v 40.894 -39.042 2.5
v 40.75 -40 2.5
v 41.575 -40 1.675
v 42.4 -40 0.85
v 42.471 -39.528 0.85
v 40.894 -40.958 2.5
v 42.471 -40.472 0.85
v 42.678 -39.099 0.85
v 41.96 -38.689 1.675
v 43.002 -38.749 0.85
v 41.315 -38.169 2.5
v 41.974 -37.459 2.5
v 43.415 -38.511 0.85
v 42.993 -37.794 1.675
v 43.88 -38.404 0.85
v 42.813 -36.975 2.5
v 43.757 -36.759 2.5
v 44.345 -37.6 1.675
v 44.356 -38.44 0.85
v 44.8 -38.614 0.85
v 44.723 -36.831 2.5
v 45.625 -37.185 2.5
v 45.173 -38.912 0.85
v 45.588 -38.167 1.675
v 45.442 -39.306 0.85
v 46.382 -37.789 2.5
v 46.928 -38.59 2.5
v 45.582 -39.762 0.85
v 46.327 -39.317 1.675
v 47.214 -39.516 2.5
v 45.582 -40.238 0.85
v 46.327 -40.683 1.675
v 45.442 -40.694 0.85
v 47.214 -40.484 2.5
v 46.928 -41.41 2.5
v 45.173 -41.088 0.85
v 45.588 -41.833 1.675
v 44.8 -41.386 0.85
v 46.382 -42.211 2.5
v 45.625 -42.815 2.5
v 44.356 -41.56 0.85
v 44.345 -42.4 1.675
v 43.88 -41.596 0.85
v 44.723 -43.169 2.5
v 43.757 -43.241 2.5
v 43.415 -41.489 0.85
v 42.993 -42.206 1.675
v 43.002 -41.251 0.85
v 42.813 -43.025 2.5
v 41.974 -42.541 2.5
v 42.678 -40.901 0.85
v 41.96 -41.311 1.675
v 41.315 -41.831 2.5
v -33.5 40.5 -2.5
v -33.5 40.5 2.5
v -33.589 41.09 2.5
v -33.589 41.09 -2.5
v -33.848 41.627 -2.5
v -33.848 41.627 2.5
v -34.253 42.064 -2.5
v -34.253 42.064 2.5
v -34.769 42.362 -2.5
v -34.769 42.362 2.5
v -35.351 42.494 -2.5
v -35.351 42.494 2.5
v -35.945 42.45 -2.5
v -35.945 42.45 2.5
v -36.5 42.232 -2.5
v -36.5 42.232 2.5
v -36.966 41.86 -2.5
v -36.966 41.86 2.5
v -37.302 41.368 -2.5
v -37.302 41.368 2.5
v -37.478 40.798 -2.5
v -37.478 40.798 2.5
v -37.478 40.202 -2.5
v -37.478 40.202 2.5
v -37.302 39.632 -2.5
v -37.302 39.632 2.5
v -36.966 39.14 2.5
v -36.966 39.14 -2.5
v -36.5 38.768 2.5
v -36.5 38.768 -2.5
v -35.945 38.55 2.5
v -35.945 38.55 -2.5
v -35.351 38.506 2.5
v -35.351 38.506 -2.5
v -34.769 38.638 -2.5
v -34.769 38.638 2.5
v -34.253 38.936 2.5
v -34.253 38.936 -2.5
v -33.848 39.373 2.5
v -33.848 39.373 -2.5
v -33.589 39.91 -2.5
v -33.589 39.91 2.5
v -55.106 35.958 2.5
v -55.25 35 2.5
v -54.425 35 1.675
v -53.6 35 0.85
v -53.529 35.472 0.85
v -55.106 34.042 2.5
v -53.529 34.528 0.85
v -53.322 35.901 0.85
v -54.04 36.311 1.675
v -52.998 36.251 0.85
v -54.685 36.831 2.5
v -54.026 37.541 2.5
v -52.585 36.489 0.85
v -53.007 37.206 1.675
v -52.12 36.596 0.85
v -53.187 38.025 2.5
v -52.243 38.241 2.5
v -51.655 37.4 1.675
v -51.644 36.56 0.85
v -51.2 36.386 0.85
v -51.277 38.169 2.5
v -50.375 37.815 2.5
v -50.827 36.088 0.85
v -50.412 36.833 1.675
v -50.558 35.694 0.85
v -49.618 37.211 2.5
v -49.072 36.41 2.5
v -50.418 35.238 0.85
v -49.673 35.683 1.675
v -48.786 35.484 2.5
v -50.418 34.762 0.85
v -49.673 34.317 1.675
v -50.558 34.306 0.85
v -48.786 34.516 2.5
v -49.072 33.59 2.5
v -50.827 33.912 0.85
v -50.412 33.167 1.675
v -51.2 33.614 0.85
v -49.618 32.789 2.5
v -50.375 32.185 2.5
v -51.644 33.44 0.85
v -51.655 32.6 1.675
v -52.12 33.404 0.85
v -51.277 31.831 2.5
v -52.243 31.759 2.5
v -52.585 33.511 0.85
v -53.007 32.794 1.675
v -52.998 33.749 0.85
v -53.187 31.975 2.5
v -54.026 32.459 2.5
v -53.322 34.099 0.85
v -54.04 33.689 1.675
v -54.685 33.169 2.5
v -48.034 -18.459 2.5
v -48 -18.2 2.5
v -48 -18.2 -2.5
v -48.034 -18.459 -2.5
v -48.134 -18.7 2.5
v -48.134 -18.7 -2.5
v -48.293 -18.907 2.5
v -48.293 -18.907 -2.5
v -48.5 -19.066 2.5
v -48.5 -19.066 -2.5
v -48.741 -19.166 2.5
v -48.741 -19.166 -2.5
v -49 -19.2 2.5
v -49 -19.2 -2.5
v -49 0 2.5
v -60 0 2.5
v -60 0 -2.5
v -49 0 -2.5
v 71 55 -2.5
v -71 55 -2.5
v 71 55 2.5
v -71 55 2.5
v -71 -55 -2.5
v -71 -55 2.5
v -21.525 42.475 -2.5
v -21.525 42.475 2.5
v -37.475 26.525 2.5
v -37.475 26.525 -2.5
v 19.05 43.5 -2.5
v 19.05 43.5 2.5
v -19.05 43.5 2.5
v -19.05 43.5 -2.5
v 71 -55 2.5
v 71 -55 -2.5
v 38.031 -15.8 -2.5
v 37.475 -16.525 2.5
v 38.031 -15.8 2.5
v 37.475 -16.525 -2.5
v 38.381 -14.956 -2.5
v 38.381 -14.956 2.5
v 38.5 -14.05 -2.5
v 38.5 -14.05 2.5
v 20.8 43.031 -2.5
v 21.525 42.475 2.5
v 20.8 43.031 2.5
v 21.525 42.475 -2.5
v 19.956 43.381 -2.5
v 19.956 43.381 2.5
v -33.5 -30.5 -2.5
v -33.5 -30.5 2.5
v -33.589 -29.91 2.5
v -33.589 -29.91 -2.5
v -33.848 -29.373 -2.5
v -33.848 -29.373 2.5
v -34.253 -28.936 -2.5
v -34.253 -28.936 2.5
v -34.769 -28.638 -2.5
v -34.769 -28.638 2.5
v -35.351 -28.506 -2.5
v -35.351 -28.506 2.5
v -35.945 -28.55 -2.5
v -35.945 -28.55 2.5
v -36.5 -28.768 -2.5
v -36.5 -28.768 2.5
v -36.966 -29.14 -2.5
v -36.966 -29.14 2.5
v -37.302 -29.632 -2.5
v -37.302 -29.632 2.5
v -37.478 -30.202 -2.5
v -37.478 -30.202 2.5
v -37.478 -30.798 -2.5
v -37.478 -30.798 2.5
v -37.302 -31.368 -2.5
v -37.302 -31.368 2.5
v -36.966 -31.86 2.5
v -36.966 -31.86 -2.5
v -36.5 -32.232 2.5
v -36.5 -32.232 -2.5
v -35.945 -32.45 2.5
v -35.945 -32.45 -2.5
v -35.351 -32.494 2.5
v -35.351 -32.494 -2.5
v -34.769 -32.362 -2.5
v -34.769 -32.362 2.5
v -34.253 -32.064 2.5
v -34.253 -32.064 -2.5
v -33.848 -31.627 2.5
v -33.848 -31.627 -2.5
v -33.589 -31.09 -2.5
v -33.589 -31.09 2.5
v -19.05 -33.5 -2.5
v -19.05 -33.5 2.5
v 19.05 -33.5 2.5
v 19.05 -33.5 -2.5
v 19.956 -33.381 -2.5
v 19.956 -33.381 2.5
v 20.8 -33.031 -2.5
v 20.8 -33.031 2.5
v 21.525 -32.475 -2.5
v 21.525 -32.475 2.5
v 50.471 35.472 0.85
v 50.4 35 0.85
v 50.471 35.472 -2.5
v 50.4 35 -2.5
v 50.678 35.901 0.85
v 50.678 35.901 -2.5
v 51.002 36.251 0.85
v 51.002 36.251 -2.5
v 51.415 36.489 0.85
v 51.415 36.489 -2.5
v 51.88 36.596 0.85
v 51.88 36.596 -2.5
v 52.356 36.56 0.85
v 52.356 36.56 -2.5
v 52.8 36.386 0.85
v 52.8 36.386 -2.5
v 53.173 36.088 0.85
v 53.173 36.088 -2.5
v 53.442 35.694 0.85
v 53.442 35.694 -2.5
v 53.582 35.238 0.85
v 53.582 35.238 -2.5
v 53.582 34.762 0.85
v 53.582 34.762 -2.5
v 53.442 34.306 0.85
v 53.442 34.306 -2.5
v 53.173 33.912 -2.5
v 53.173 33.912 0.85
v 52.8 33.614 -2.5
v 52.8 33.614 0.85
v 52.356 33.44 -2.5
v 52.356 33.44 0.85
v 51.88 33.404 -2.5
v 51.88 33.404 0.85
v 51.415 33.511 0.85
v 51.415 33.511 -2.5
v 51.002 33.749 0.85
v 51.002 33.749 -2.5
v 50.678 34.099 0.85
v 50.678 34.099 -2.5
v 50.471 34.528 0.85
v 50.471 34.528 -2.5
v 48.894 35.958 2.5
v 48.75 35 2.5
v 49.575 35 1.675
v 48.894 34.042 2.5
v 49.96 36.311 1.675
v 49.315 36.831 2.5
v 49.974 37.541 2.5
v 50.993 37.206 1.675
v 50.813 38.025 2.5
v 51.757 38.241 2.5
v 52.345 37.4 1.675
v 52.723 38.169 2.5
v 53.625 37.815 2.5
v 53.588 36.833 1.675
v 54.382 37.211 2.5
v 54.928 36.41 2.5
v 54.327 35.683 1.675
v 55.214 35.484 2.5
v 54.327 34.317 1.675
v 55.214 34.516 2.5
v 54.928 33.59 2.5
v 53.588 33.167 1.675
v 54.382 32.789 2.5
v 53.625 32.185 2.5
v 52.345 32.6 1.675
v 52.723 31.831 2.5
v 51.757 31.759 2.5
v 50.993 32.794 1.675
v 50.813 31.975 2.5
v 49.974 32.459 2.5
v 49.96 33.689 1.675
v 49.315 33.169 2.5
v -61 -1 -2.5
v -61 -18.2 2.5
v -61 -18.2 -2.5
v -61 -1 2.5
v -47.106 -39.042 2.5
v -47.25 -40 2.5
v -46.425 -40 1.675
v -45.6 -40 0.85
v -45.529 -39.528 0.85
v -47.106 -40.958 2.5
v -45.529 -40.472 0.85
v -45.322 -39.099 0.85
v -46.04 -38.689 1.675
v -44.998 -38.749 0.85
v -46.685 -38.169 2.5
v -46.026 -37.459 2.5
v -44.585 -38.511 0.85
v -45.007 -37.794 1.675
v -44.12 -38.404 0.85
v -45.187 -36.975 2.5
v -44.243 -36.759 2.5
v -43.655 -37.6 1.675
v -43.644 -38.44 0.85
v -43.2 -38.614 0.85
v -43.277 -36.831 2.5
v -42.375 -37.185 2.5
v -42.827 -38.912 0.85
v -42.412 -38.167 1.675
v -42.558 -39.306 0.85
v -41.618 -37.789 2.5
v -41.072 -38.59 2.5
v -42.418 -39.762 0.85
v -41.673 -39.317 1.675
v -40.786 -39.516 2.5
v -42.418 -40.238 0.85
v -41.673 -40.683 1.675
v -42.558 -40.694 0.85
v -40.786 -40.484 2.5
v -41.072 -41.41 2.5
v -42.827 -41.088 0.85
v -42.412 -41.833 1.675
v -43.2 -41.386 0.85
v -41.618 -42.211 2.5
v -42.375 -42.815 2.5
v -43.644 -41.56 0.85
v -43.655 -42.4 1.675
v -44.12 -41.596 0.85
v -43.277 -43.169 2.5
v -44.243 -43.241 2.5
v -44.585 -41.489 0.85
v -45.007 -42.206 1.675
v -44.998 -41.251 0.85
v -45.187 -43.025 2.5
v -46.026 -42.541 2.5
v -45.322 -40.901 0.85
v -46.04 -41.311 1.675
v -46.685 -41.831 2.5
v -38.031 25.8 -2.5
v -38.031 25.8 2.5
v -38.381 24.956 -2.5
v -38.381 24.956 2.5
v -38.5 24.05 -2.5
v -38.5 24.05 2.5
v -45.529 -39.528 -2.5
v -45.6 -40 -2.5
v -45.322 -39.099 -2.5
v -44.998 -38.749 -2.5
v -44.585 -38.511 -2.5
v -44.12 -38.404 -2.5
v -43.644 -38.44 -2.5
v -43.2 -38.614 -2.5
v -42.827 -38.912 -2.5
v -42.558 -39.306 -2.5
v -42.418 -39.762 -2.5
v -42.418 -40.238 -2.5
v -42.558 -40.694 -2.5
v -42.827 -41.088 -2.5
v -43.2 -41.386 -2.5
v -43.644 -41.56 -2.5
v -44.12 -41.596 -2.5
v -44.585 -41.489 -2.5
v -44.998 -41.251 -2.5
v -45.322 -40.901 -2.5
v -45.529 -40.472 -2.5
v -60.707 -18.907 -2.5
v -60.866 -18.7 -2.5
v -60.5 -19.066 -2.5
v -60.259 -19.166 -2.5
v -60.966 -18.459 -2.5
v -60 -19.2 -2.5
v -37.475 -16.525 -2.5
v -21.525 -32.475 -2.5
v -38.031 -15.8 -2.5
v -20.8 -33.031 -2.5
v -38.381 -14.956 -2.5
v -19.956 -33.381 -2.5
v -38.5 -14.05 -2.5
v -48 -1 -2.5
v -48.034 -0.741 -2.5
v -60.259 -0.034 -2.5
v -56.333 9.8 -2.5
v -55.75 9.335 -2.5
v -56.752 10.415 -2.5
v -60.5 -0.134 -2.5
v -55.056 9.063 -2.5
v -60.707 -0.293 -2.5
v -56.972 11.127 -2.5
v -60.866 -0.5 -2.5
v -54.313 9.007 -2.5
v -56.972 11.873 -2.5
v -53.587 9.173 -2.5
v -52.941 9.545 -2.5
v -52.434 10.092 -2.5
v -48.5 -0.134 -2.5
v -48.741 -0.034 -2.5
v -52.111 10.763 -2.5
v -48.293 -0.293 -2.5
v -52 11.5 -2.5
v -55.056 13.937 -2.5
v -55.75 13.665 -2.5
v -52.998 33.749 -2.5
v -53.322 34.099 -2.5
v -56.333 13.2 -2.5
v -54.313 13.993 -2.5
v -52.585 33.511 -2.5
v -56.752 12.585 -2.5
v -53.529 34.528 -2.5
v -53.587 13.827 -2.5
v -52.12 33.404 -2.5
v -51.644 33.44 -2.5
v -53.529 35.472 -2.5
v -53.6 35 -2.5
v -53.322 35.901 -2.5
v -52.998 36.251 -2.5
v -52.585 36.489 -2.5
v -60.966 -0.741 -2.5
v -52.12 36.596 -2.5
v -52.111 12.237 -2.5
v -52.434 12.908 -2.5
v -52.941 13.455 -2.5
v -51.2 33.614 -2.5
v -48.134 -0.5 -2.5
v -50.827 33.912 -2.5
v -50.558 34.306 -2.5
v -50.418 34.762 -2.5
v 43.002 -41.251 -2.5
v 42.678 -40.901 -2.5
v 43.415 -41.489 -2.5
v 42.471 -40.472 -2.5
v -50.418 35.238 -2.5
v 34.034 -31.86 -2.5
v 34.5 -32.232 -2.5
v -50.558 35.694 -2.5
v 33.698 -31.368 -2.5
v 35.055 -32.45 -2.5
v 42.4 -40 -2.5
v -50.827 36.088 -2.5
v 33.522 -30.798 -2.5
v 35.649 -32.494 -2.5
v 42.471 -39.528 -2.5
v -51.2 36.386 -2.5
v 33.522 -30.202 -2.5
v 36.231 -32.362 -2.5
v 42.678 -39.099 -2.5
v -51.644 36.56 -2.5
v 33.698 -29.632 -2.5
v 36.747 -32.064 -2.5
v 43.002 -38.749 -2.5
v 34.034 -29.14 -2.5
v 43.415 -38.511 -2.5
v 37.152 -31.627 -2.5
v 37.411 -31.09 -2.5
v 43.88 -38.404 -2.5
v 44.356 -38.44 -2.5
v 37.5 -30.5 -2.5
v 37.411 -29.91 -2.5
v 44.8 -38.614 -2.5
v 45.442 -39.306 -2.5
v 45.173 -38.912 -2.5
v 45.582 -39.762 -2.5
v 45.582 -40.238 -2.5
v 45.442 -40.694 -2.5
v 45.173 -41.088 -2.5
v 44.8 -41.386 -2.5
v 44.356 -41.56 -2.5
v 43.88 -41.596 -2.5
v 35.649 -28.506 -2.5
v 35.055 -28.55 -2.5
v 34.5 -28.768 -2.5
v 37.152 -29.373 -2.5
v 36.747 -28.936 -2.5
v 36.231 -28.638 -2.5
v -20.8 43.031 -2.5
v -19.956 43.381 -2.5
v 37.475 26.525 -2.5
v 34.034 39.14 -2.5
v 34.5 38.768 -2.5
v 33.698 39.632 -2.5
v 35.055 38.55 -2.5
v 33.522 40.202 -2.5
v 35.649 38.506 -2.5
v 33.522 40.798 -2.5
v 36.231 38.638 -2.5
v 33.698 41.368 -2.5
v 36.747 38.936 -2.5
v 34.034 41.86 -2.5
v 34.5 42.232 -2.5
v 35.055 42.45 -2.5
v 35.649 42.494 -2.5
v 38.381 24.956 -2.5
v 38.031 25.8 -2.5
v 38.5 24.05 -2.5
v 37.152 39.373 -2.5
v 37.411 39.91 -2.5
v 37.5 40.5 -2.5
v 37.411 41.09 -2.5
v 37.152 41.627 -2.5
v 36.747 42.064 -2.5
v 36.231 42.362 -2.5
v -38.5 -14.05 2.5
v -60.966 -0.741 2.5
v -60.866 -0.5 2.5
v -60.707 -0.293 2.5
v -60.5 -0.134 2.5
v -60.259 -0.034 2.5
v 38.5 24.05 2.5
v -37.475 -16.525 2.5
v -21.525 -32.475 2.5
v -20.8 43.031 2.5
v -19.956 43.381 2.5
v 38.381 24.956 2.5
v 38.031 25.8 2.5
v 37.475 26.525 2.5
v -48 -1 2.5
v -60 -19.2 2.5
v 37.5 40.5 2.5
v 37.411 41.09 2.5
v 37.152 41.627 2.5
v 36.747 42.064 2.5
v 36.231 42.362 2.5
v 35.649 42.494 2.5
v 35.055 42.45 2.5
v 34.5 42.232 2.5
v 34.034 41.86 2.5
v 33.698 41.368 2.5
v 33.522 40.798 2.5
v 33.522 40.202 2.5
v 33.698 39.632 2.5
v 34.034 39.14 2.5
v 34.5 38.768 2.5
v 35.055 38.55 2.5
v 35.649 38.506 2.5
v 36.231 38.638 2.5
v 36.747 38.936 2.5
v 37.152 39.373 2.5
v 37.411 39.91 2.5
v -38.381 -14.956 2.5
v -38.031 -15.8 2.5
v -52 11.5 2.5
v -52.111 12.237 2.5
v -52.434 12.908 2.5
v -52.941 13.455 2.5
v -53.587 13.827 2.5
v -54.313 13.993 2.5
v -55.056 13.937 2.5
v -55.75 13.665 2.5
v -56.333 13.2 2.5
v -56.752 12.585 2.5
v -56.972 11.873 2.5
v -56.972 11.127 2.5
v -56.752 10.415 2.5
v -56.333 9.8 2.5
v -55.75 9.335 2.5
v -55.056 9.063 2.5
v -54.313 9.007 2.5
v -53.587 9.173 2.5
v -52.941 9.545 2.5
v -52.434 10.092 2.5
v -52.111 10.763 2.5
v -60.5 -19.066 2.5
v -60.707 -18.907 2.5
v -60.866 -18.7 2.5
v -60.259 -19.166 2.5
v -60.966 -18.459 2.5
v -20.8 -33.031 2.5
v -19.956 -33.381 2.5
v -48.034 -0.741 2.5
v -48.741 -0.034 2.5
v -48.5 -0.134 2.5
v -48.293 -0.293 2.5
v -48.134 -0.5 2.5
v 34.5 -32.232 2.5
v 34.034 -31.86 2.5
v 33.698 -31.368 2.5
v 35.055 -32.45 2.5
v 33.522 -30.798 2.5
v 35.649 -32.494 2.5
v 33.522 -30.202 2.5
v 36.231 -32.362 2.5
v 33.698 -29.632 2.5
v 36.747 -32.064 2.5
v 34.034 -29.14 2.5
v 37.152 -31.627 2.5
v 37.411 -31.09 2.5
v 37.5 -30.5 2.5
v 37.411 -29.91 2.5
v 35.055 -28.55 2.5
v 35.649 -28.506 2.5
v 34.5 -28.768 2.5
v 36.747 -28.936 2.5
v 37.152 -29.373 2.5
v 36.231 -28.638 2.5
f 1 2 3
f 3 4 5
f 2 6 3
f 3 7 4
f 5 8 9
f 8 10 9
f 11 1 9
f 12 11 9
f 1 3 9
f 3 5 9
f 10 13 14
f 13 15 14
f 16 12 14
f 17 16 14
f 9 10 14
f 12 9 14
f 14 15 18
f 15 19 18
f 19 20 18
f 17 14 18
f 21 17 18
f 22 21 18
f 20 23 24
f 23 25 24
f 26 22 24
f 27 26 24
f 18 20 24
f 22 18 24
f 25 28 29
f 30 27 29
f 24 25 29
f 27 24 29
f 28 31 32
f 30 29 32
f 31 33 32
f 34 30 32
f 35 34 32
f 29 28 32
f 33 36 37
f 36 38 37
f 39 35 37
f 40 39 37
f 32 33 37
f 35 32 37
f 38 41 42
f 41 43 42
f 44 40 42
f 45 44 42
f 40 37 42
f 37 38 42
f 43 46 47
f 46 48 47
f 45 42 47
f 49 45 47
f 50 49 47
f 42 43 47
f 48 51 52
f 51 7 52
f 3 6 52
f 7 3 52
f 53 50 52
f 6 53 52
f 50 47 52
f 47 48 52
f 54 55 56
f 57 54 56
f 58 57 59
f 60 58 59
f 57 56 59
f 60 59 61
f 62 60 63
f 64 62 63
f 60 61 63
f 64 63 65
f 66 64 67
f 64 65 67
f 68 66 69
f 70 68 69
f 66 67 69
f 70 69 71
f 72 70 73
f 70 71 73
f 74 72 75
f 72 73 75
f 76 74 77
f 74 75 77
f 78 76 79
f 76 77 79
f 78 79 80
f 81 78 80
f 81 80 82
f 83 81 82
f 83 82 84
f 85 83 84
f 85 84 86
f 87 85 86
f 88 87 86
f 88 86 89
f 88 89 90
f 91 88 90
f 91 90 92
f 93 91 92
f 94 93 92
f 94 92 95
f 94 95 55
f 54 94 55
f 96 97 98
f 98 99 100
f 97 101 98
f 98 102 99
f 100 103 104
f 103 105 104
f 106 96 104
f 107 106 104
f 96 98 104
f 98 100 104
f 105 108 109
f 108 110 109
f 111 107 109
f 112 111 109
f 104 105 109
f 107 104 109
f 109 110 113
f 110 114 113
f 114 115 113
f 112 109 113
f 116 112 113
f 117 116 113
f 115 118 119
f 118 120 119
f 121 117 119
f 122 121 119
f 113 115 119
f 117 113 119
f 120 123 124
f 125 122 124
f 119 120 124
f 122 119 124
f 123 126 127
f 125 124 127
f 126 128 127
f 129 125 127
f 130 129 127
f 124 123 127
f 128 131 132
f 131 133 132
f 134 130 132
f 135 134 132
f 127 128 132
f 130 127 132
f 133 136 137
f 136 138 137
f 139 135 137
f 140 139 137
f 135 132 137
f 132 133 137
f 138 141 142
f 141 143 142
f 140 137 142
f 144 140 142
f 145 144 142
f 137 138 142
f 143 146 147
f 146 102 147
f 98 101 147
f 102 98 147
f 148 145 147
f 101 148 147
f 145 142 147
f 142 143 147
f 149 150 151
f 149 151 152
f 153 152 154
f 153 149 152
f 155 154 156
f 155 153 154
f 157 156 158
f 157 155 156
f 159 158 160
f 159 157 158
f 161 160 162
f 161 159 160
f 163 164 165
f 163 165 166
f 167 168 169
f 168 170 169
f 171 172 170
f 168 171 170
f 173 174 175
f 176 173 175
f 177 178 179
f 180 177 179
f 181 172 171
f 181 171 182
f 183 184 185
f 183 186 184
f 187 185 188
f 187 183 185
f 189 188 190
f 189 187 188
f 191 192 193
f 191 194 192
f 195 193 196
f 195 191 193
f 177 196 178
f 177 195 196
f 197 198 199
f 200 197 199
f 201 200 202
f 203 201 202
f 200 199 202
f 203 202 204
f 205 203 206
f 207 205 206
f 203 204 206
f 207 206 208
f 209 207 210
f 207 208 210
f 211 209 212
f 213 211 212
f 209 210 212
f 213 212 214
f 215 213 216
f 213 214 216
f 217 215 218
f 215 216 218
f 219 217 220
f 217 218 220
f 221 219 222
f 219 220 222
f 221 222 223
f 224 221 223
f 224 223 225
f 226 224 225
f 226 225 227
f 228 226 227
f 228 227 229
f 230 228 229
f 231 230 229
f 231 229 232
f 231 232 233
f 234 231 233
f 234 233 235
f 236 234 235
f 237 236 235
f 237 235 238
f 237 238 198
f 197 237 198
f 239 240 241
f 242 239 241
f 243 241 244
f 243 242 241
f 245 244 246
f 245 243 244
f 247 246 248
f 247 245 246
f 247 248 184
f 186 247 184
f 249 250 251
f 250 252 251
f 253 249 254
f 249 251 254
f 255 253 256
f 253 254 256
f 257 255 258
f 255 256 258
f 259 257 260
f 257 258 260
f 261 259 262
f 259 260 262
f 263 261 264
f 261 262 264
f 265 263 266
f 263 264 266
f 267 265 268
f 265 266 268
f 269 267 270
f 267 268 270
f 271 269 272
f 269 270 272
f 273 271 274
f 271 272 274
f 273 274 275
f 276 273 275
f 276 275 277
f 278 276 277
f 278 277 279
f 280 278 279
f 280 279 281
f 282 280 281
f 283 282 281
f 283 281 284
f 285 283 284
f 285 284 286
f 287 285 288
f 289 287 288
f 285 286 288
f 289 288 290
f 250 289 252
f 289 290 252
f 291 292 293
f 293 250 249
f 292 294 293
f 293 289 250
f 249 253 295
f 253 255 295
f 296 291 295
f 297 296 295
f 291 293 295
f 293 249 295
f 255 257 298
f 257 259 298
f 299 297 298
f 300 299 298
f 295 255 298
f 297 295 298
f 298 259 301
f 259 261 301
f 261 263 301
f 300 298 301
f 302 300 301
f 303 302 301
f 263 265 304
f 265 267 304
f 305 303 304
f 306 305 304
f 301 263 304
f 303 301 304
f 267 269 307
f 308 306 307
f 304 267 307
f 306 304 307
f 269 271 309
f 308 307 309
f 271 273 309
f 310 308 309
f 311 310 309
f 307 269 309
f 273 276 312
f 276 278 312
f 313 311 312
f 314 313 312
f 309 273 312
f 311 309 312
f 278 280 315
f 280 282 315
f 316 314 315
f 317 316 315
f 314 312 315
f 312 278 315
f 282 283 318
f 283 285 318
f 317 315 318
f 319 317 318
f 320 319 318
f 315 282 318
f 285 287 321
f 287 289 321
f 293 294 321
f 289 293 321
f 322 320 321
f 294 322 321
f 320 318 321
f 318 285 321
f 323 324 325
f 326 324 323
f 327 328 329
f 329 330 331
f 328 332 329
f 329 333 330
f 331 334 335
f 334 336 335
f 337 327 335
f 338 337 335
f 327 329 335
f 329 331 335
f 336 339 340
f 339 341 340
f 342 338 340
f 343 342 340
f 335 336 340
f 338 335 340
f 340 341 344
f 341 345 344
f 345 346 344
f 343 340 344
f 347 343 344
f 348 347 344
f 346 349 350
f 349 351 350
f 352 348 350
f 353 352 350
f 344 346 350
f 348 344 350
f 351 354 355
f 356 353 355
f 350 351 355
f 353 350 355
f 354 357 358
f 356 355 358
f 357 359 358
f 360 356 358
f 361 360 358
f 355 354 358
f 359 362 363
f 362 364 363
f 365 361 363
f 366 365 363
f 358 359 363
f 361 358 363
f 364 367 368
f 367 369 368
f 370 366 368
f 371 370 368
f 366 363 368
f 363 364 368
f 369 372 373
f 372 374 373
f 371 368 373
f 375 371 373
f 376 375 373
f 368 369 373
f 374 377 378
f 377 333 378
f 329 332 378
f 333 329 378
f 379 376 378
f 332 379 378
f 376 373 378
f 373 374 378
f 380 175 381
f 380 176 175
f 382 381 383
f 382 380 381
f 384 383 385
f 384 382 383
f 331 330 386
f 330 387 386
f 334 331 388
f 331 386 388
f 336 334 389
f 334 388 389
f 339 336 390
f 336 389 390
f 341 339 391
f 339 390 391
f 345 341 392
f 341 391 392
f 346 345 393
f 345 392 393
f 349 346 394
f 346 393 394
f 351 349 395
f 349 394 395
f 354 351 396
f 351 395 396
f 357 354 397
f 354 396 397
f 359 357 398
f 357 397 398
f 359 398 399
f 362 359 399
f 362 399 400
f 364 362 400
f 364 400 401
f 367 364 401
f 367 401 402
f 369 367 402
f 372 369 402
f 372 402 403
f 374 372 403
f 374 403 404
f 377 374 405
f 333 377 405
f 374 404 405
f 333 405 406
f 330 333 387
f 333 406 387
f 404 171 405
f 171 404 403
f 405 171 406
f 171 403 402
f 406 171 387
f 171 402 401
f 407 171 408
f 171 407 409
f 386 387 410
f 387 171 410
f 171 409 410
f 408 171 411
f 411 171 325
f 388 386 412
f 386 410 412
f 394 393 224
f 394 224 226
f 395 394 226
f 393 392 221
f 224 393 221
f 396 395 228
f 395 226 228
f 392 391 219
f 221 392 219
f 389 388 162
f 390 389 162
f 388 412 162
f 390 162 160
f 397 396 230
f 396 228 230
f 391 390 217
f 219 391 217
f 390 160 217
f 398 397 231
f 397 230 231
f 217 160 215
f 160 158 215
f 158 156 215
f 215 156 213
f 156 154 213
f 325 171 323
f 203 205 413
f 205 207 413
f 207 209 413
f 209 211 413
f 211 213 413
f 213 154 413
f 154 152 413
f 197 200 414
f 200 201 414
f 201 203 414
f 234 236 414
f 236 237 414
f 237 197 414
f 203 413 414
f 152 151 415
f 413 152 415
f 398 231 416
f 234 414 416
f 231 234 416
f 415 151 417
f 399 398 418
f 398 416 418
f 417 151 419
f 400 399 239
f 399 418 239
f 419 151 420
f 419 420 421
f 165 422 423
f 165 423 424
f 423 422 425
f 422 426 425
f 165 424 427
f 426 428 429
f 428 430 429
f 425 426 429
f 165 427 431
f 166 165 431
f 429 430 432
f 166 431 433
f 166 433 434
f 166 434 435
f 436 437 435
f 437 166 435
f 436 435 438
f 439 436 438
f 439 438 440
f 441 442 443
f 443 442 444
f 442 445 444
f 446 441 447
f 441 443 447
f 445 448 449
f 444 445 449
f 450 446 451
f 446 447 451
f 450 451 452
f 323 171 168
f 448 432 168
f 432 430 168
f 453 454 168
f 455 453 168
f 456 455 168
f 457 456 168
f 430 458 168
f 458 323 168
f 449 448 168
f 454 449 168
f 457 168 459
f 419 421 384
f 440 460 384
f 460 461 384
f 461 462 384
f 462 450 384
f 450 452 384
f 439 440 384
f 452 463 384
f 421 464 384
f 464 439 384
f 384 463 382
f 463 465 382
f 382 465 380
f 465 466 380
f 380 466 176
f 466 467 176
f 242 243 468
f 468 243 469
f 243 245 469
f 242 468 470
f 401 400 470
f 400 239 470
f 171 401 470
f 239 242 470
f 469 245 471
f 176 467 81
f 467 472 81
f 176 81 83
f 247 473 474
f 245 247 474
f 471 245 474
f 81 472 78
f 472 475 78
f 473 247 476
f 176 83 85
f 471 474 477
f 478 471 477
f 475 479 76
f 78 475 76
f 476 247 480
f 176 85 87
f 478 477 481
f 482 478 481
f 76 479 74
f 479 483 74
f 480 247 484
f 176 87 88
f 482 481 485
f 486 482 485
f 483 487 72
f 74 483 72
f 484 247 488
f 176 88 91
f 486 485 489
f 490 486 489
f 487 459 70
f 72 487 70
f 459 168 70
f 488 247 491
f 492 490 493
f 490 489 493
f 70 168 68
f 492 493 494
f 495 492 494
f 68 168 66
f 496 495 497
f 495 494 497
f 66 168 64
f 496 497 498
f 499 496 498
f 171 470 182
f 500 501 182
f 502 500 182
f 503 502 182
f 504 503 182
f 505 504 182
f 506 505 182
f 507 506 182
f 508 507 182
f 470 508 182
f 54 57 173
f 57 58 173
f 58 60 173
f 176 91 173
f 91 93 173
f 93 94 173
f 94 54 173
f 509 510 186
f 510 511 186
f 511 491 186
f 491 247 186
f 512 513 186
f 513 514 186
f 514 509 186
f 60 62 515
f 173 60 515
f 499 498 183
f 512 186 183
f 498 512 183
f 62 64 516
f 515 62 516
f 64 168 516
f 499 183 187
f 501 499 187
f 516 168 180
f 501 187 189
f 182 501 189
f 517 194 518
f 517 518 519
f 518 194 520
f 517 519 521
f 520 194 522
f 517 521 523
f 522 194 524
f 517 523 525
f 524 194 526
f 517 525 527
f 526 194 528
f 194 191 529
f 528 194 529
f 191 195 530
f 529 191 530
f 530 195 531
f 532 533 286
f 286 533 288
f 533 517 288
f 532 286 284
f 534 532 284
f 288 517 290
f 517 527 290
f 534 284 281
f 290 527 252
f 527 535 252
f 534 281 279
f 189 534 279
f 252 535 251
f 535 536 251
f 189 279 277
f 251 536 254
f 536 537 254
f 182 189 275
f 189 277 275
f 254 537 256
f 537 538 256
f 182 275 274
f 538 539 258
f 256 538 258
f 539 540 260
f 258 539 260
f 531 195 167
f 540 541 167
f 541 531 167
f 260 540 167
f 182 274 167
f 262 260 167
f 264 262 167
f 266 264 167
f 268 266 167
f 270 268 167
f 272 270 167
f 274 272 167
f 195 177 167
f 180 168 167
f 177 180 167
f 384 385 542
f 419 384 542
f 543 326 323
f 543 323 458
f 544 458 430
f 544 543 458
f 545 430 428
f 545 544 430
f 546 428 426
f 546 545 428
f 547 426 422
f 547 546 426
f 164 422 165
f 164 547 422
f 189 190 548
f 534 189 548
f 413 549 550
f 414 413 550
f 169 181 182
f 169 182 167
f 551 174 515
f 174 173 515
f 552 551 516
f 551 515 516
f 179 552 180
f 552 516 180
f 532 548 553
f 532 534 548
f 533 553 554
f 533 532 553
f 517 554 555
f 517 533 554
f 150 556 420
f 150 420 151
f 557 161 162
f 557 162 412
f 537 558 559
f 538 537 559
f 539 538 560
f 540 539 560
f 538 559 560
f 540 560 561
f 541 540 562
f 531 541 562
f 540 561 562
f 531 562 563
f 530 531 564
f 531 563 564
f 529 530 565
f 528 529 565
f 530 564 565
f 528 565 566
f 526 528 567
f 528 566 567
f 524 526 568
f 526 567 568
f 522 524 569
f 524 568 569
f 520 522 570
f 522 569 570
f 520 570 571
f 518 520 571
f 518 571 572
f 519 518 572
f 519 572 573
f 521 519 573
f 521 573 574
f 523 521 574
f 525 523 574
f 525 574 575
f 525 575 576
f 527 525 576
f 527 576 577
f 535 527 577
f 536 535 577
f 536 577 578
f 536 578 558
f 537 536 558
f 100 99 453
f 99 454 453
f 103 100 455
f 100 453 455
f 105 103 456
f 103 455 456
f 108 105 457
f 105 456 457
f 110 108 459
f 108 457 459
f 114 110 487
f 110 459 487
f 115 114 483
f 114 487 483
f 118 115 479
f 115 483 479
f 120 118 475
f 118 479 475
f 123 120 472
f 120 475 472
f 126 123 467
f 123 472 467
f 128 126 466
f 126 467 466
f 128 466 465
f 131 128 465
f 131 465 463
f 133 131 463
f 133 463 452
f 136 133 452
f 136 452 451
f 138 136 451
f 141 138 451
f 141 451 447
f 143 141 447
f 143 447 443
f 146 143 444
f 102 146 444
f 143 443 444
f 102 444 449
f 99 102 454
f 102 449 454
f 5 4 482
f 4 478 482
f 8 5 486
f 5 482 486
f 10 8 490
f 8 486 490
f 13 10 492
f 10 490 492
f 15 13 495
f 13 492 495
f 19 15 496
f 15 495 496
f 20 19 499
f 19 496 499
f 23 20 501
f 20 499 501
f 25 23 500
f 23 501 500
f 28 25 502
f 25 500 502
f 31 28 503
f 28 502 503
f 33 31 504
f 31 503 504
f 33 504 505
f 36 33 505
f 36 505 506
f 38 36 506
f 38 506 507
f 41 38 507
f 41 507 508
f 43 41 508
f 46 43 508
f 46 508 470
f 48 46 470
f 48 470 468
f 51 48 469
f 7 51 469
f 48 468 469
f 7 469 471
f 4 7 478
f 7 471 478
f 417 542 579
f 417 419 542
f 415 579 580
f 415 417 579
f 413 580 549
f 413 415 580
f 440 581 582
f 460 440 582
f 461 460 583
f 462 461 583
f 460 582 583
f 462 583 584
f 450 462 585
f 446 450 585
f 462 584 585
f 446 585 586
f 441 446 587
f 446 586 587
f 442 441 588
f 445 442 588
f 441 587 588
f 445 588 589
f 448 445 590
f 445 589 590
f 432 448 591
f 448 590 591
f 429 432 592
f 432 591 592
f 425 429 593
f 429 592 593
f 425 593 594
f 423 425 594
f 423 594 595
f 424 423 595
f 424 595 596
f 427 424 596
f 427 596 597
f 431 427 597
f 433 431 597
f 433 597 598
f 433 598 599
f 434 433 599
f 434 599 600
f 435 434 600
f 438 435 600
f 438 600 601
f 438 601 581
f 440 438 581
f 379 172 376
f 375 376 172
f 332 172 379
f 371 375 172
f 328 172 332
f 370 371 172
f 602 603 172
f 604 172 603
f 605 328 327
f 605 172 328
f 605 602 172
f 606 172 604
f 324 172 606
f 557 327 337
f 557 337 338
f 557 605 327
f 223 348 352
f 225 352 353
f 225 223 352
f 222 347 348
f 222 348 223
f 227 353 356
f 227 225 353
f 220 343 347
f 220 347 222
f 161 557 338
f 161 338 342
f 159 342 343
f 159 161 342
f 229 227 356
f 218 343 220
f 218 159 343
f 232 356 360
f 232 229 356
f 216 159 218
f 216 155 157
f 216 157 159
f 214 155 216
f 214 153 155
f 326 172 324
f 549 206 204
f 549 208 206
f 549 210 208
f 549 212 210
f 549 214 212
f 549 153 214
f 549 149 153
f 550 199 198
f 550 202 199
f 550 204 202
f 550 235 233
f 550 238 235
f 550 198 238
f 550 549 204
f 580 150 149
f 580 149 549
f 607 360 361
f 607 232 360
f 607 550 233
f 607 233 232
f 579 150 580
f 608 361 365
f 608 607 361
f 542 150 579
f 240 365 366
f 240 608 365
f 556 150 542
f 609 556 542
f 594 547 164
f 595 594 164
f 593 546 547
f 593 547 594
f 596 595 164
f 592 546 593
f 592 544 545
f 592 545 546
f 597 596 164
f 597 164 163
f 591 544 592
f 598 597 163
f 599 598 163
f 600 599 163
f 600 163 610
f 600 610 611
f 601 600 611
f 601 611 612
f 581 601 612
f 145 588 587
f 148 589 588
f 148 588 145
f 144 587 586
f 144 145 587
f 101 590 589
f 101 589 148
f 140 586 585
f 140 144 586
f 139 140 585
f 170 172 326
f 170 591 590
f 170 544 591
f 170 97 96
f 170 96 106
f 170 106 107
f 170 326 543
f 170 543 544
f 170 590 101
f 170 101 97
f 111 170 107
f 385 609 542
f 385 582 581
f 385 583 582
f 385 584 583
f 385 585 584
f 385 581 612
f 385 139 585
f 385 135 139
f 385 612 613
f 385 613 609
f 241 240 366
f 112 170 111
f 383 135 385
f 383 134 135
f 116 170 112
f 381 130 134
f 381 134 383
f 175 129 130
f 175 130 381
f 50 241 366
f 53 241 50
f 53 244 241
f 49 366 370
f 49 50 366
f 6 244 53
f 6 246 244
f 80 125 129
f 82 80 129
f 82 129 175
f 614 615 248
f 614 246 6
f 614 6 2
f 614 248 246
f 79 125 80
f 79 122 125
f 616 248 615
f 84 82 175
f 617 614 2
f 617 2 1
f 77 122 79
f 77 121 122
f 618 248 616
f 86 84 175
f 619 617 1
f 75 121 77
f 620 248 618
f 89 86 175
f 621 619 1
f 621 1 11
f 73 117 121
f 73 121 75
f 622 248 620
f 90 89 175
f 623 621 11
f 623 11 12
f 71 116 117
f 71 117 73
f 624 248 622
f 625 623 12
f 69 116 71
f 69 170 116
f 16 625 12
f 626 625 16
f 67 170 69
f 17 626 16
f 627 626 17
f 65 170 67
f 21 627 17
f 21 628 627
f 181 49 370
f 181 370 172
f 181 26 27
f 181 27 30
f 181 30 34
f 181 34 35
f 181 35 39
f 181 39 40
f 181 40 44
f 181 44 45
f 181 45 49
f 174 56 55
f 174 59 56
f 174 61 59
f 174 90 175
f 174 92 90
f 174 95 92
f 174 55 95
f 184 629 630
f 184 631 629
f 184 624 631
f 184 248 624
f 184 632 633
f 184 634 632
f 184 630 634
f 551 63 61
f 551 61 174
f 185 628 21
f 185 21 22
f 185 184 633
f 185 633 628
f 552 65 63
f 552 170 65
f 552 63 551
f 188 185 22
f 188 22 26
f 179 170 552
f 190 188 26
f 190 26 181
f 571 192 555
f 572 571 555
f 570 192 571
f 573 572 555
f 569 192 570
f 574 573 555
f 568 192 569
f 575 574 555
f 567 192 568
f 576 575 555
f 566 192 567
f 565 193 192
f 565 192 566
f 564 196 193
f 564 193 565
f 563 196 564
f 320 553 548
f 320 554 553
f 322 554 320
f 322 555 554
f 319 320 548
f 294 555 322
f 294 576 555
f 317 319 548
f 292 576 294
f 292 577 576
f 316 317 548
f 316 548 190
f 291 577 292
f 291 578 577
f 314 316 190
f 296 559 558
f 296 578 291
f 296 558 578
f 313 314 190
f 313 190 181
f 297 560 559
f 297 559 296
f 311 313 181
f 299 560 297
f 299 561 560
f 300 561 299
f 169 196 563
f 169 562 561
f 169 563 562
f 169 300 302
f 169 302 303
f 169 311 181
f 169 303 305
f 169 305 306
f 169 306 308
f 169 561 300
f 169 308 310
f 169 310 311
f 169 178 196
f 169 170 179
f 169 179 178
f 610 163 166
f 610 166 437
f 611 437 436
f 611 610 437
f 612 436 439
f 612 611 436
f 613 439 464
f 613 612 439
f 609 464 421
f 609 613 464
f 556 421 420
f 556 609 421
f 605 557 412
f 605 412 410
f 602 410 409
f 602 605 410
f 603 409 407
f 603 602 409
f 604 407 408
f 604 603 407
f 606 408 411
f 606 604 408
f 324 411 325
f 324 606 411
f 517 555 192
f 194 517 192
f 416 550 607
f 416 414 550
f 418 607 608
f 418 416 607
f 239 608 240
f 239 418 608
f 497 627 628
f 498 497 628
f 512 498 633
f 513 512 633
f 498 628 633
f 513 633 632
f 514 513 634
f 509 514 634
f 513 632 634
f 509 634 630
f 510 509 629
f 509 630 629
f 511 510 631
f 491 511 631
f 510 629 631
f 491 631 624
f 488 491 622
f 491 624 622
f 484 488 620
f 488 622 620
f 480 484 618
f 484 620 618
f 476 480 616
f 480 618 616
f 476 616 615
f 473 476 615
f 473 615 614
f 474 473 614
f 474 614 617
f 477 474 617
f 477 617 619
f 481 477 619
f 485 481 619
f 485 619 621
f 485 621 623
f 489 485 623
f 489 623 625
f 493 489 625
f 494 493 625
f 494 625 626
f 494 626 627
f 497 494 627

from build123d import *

# Parameters (mm, degrees)
SKETCH1_W                              = 142
SKETCH1_H                              = 110
SHEET_DEPTH                            = 2.5
SKETCH7_R                              = 2
FANHOLES_DEPTH                         = 6
FILLET1_R                              = 3.5
F_3_2_3_2_TOPMOUNTHOLES_D              = 3.2
F_3_2_3_2_TOPMOUNTHOLES_CSINK_D        = 6.5
F_3_2_3_2_TOPMOUNTHOLES_CSINK_ANGLE    = 90
F_3_2_3_2_BOTTOMMOUNTHOLES_D           = 3.2
F_3_2_3_2_BOTTOMMOUNTHOLES_CSINK_D     = 6.5
F_3_2_3_2_BOTTOMMOUNTHOLES_CSINK_ANGLE = 90
SWITCHSLOT_DEPTH                       = 6
SKETCH8_R                              = 2.5
LEDHOLE_DEPTH                          = 6


with BuildPart() as part:
    # Sketch1 → Sheet (new body, symmetric)
    with BuildSketch(Plane.XY):
        Rectangle(SKETCH1_W, SKETCH1_H)
    extrude(amount=SHEET_DEPTH, both=True)

    # Sketch7 → FanHoles (cut, through all)
    with BuildSketch(Plane.XY.offset(2.5)):
        with Locations((-35.5, -30.5)):
            Circle(SKETCH7_R)
        with Locations((35.5, -30.5)):
            Circle(SKETCH7_R)
        with Locations((35.5, 40.5)):
            Circle(SKETCH7_R)
        with Locations((-35.5, 40.5)):
            Circle(SKETCH7_R)
        Polygon((-20.5, 43.5), (-38.5, 25.5), (-38.5, -15.5), (-20.5, -33.5), (20.5, -33.5), (38.5, -15.5), (38.5, 25.5), (20.5, 43.5), align=None)
    extrude(amount=-FANHOLES_DEPTH, mode=Mode.SUBTRACT)

    # Fillet1
    fillet1_edges = [part.edges().sort_by_distance(p)[0] for p in [
        (-20.5, 43.5, 0),
        (20.5, 43.5, 0),
        (38.5, 25.5, 0),
        (38.5, -15.5, 0),
        (20.5, -33.5, 0),
        (-20.5, -33.5, 0),
        (-38.5, -15.5, 0),
        (-38.5, 25.5, 0),
    ]]
    fillet(fillet1_edges, radius=FILLET1_R)

    # Ø3.2 (3.2) TopMountHoles (through all)
    with Locations(Plane.XY.offset(2.5)):
        with Locations((-52, 35), (52, 35)):
            CounterSinkHole(F_3_2_3_2_TOPMOUNTHOLES_D / 2, F_3_2_3_2_TOPMOUNTHOLES_CSINK_D / 2, counter_sink_angle=F_3_2_3_2_TOPMOUNTHOLES_CSINK_ANGLE)

    # Ø3.2 (3.2) BottomMountHoles (through all)
    with Locations(Plane.XY.offset(2.5)):
        with Locations((-44, -40), (44, -40)):
            CounterSinkHole(F_3_2_3_2_BOTTOMMOUNTHOLES_D / 2, F_3_2_3_2_BOTTOMMOUNTHOLES_CSINK_D / 2, counter_sink_angle=F_3_2_3_2_BOTTOMMOUNTHOLES_CSINK_ANGLE)

    # Sketch13 → SwitchSlot (cut, through all)
    with BuildSketch(Plane.XY.offset(2.5)):
        with BuildLine():
            Line((-60, 0), (-49, 0))
            ThreePointArc((-49, 0), (-48.292893219, -0.292893219), (-48, -1))
            Line((-48, -1), (-48, -18.2))
            ThreePointArc((-48, -18.2), (-48.292893219, -18.907106781), (-49, -19.2))
            Line((-49, -19.2), (-60, -19.2))
            ThreePointArc((-60, -19.2), (-60.707106781, -18.907106781), (-61, -18.2))
            Line((-61, -18.2), (-61, -1))
            ThreePointArc((-61, -1), (-60.707106781, -0.292893219), (-60, 0))
        make_face()
    extrude(amount=-SWITCHSLOT_DEPTH, mode=Mode.SUBTRACT)

    # Sketch8 → LEDHole (cut, through all)
    with BuildSketch(Plane.XY.offset(2.5)):
        with Locations((-54.5, 11.5)):
            Circle(SKETCH8_R)
    extrude(amount=-LEDHOLE_DEPTH, mode=Mode.SUBTRACT)


solid = part.part
